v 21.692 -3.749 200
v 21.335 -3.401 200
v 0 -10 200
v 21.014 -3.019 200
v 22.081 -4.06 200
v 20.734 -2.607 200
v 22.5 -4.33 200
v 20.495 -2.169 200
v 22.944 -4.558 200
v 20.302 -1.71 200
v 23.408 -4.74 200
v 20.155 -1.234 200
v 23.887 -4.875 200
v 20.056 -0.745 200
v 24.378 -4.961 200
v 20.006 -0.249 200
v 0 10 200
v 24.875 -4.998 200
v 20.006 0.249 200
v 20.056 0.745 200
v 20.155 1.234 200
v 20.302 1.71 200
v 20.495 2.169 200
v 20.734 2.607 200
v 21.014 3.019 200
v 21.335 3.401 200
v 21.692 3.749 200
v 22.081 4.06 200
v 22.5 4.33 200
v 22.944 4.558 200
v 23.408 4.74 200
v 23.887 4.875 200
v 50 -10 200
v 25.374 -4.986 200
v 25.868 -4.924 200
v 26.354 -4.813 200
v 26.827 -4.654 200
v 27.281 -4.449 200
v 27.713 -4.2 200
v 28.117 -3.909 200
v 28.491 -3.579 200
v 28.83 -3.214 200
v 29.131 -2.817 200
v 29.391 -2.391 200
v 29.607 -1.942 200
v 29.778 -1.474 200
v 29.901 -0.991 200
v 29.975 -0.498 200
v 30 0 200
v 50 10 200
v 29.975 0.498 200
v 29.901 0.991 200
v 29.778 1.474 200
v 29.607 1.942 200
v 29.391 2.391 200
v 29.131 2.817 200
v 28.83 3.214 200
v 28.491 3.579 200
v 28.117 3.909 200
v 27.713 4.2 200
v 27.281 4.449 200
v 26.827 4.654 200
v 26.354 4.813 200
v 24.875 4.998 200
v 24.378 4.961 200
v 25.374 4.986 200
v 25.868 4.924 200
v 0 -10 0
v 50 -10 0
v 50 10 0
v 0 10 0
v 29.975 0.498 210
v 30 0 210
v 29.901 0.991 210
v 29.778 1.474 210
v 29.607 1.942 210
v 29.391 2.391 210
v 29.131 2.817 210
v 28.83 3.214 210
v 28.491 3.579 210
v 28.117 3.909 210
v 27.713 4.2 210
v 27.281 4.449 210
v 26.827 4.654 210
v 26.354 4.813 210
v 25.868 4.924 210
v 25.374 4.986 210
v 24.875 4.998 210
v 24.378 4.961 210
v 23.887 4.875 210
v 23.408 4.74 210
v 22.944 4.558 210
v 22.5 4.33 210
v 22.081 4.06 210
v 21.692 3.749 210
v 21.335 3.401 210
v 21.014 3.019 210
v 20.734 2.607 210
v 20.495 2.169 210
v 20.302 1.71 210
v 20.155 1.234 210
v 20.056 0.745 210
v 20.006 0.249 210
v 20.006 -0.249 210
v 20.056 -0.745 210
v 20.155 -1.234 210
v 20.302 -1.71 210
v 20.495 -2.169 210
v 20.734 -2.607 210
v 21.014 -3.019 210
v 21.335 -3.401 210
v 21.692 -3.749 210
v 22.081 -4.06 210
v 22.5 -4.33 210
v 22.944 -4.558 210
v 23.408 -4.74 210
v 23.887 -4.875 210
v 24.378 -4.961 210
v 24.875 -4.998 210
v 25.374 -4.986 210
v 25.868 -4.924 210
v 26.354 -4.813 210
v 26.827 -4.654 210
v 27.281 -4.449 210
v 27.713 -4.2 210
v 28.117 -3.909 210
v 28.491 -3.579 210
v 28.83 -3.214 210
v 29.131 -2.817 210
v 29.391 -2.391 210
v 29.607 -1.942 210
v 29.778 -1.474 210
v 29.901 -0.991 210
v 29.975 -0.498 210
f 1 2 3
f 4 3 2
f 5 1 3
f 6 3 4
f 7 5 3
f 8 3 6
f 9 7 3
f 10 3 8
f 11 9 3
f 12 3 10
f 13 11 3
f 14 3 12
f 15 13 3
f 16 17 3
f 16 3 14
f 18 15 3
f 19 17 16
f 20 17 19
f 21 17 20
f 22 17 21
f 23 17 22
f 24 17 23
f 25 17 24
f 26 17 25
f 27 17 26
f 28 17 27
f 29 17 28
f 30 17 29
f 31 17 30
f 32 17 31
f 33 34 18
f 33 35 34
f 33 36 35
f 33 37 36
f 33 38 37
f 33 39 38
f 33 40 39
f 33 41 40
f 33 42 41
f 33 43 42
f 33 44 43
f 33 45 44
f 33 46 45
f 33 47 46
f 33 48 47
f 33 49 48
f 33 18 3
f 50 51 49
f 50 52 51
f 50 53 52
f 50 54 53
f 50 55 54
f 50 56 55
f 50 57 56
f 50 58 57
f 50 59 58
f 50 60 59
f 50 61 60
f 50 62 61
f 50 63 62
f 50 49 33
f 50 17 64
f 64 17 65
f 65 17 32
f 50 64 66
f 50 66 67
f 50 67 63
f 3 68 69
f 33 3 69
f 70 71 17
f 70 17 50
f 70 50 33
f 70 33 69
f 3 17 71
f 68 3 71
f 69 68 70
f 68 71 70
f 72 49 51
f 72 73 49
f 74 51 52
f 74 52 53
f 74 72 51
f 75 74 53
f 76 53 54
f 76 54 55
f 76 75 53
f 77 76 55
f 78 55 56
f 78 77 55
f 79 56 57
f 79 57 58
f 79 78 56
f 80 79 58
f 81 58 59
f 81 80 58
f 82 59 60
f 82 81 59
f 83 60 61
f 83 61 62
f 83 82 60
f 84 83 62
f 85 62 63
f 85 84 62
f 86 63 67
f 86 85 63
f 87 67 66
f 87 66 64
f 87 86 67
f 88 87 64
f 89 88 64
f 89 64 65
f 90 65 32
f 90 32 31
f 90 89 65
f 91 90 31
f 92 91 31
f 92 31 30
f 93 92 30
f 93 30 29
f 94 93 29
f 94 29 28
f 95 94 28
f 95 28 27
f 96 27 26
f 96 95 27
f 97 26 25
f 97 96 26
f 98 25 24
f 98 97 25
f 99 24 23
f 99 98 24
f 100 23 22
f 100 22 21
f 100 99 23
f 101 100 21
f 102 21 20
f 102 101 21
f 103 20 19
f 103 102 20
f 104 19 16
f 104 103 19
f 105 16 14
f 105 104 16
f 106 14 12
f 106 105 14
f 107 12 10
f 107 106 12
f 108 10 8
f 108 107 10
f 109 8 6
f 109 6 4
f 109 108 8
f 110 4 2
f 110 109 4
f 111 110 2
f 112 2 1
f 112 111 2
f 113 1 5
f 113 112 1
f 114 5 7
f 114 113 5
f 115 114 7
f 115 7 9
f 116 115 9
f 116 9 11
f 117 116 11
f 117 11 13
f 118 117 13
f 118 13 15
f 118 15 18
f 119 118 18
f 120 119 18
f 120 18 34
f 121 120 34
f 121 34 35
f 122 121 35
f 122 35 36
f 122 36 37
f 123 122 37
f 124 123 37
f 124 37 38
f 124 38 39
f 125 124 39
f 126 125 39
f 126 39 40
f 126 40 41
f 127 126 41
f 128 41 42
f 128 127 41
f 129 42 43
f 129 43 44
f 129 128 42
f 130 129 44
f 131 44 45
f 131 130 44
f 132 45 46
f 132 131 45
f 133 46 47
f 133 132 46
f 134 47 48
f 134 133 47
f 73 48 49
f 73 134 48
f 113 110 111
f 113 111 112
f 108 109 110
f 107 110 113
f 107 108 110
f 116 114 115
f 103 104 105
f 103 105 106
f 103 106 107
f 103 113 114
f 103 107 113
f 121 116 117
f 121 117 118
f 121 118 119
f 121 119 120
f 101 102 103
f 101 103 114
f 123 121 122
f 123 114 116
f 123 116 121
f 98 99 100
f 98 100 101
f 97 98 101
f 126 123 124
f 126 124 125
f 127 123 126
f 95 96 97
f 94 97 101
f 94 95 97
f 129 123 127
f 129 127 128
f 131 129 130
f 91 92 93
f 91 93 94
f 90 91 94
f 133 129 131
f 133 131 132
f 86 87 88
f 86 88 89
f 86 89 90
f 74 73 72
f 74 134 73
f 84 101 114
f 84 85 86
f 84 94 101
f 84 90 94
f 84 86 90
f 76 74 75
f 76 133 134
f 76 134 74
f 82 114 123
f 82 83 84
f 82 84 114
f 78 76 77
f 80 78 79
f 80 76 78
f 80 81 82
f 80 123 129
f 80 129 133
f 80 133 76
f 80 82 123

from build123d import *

# Parameters (mm, degrees)
SKETCH_1_W      = 50
SKETCH_1_H      = 200
EXTRUDE_1_DEPTH = 10
SKETCH_2_R      = 5
EXTRUDE_2_DEPTH = 10


with BuildPart() as part:
    # 草图1 → 凸台-拉伸1 (new body, symmetric)
    with BuildSketch(Plane(origin=(0, 0, 0), x_dir=(1, 0, 0), z_dir=(0, 1, 0))):
        with Locations((25, -100)):
            Rectangle(SKETCH_1_W, SKETCH_1_H)
    extrude(amount=EXTRUDE_1_DEPTH, both=True)

    # 草图2 → 凸台-拉伸2 (add, symmetric)
    with BuildSketch(Plane.XY.offset(200)):
        with Locations((25, 0)):
            Circle(SKETCH_2_R)
    extrude(amount=EXTRUDE_2_DEPTH, both=True)


solid = part.part
